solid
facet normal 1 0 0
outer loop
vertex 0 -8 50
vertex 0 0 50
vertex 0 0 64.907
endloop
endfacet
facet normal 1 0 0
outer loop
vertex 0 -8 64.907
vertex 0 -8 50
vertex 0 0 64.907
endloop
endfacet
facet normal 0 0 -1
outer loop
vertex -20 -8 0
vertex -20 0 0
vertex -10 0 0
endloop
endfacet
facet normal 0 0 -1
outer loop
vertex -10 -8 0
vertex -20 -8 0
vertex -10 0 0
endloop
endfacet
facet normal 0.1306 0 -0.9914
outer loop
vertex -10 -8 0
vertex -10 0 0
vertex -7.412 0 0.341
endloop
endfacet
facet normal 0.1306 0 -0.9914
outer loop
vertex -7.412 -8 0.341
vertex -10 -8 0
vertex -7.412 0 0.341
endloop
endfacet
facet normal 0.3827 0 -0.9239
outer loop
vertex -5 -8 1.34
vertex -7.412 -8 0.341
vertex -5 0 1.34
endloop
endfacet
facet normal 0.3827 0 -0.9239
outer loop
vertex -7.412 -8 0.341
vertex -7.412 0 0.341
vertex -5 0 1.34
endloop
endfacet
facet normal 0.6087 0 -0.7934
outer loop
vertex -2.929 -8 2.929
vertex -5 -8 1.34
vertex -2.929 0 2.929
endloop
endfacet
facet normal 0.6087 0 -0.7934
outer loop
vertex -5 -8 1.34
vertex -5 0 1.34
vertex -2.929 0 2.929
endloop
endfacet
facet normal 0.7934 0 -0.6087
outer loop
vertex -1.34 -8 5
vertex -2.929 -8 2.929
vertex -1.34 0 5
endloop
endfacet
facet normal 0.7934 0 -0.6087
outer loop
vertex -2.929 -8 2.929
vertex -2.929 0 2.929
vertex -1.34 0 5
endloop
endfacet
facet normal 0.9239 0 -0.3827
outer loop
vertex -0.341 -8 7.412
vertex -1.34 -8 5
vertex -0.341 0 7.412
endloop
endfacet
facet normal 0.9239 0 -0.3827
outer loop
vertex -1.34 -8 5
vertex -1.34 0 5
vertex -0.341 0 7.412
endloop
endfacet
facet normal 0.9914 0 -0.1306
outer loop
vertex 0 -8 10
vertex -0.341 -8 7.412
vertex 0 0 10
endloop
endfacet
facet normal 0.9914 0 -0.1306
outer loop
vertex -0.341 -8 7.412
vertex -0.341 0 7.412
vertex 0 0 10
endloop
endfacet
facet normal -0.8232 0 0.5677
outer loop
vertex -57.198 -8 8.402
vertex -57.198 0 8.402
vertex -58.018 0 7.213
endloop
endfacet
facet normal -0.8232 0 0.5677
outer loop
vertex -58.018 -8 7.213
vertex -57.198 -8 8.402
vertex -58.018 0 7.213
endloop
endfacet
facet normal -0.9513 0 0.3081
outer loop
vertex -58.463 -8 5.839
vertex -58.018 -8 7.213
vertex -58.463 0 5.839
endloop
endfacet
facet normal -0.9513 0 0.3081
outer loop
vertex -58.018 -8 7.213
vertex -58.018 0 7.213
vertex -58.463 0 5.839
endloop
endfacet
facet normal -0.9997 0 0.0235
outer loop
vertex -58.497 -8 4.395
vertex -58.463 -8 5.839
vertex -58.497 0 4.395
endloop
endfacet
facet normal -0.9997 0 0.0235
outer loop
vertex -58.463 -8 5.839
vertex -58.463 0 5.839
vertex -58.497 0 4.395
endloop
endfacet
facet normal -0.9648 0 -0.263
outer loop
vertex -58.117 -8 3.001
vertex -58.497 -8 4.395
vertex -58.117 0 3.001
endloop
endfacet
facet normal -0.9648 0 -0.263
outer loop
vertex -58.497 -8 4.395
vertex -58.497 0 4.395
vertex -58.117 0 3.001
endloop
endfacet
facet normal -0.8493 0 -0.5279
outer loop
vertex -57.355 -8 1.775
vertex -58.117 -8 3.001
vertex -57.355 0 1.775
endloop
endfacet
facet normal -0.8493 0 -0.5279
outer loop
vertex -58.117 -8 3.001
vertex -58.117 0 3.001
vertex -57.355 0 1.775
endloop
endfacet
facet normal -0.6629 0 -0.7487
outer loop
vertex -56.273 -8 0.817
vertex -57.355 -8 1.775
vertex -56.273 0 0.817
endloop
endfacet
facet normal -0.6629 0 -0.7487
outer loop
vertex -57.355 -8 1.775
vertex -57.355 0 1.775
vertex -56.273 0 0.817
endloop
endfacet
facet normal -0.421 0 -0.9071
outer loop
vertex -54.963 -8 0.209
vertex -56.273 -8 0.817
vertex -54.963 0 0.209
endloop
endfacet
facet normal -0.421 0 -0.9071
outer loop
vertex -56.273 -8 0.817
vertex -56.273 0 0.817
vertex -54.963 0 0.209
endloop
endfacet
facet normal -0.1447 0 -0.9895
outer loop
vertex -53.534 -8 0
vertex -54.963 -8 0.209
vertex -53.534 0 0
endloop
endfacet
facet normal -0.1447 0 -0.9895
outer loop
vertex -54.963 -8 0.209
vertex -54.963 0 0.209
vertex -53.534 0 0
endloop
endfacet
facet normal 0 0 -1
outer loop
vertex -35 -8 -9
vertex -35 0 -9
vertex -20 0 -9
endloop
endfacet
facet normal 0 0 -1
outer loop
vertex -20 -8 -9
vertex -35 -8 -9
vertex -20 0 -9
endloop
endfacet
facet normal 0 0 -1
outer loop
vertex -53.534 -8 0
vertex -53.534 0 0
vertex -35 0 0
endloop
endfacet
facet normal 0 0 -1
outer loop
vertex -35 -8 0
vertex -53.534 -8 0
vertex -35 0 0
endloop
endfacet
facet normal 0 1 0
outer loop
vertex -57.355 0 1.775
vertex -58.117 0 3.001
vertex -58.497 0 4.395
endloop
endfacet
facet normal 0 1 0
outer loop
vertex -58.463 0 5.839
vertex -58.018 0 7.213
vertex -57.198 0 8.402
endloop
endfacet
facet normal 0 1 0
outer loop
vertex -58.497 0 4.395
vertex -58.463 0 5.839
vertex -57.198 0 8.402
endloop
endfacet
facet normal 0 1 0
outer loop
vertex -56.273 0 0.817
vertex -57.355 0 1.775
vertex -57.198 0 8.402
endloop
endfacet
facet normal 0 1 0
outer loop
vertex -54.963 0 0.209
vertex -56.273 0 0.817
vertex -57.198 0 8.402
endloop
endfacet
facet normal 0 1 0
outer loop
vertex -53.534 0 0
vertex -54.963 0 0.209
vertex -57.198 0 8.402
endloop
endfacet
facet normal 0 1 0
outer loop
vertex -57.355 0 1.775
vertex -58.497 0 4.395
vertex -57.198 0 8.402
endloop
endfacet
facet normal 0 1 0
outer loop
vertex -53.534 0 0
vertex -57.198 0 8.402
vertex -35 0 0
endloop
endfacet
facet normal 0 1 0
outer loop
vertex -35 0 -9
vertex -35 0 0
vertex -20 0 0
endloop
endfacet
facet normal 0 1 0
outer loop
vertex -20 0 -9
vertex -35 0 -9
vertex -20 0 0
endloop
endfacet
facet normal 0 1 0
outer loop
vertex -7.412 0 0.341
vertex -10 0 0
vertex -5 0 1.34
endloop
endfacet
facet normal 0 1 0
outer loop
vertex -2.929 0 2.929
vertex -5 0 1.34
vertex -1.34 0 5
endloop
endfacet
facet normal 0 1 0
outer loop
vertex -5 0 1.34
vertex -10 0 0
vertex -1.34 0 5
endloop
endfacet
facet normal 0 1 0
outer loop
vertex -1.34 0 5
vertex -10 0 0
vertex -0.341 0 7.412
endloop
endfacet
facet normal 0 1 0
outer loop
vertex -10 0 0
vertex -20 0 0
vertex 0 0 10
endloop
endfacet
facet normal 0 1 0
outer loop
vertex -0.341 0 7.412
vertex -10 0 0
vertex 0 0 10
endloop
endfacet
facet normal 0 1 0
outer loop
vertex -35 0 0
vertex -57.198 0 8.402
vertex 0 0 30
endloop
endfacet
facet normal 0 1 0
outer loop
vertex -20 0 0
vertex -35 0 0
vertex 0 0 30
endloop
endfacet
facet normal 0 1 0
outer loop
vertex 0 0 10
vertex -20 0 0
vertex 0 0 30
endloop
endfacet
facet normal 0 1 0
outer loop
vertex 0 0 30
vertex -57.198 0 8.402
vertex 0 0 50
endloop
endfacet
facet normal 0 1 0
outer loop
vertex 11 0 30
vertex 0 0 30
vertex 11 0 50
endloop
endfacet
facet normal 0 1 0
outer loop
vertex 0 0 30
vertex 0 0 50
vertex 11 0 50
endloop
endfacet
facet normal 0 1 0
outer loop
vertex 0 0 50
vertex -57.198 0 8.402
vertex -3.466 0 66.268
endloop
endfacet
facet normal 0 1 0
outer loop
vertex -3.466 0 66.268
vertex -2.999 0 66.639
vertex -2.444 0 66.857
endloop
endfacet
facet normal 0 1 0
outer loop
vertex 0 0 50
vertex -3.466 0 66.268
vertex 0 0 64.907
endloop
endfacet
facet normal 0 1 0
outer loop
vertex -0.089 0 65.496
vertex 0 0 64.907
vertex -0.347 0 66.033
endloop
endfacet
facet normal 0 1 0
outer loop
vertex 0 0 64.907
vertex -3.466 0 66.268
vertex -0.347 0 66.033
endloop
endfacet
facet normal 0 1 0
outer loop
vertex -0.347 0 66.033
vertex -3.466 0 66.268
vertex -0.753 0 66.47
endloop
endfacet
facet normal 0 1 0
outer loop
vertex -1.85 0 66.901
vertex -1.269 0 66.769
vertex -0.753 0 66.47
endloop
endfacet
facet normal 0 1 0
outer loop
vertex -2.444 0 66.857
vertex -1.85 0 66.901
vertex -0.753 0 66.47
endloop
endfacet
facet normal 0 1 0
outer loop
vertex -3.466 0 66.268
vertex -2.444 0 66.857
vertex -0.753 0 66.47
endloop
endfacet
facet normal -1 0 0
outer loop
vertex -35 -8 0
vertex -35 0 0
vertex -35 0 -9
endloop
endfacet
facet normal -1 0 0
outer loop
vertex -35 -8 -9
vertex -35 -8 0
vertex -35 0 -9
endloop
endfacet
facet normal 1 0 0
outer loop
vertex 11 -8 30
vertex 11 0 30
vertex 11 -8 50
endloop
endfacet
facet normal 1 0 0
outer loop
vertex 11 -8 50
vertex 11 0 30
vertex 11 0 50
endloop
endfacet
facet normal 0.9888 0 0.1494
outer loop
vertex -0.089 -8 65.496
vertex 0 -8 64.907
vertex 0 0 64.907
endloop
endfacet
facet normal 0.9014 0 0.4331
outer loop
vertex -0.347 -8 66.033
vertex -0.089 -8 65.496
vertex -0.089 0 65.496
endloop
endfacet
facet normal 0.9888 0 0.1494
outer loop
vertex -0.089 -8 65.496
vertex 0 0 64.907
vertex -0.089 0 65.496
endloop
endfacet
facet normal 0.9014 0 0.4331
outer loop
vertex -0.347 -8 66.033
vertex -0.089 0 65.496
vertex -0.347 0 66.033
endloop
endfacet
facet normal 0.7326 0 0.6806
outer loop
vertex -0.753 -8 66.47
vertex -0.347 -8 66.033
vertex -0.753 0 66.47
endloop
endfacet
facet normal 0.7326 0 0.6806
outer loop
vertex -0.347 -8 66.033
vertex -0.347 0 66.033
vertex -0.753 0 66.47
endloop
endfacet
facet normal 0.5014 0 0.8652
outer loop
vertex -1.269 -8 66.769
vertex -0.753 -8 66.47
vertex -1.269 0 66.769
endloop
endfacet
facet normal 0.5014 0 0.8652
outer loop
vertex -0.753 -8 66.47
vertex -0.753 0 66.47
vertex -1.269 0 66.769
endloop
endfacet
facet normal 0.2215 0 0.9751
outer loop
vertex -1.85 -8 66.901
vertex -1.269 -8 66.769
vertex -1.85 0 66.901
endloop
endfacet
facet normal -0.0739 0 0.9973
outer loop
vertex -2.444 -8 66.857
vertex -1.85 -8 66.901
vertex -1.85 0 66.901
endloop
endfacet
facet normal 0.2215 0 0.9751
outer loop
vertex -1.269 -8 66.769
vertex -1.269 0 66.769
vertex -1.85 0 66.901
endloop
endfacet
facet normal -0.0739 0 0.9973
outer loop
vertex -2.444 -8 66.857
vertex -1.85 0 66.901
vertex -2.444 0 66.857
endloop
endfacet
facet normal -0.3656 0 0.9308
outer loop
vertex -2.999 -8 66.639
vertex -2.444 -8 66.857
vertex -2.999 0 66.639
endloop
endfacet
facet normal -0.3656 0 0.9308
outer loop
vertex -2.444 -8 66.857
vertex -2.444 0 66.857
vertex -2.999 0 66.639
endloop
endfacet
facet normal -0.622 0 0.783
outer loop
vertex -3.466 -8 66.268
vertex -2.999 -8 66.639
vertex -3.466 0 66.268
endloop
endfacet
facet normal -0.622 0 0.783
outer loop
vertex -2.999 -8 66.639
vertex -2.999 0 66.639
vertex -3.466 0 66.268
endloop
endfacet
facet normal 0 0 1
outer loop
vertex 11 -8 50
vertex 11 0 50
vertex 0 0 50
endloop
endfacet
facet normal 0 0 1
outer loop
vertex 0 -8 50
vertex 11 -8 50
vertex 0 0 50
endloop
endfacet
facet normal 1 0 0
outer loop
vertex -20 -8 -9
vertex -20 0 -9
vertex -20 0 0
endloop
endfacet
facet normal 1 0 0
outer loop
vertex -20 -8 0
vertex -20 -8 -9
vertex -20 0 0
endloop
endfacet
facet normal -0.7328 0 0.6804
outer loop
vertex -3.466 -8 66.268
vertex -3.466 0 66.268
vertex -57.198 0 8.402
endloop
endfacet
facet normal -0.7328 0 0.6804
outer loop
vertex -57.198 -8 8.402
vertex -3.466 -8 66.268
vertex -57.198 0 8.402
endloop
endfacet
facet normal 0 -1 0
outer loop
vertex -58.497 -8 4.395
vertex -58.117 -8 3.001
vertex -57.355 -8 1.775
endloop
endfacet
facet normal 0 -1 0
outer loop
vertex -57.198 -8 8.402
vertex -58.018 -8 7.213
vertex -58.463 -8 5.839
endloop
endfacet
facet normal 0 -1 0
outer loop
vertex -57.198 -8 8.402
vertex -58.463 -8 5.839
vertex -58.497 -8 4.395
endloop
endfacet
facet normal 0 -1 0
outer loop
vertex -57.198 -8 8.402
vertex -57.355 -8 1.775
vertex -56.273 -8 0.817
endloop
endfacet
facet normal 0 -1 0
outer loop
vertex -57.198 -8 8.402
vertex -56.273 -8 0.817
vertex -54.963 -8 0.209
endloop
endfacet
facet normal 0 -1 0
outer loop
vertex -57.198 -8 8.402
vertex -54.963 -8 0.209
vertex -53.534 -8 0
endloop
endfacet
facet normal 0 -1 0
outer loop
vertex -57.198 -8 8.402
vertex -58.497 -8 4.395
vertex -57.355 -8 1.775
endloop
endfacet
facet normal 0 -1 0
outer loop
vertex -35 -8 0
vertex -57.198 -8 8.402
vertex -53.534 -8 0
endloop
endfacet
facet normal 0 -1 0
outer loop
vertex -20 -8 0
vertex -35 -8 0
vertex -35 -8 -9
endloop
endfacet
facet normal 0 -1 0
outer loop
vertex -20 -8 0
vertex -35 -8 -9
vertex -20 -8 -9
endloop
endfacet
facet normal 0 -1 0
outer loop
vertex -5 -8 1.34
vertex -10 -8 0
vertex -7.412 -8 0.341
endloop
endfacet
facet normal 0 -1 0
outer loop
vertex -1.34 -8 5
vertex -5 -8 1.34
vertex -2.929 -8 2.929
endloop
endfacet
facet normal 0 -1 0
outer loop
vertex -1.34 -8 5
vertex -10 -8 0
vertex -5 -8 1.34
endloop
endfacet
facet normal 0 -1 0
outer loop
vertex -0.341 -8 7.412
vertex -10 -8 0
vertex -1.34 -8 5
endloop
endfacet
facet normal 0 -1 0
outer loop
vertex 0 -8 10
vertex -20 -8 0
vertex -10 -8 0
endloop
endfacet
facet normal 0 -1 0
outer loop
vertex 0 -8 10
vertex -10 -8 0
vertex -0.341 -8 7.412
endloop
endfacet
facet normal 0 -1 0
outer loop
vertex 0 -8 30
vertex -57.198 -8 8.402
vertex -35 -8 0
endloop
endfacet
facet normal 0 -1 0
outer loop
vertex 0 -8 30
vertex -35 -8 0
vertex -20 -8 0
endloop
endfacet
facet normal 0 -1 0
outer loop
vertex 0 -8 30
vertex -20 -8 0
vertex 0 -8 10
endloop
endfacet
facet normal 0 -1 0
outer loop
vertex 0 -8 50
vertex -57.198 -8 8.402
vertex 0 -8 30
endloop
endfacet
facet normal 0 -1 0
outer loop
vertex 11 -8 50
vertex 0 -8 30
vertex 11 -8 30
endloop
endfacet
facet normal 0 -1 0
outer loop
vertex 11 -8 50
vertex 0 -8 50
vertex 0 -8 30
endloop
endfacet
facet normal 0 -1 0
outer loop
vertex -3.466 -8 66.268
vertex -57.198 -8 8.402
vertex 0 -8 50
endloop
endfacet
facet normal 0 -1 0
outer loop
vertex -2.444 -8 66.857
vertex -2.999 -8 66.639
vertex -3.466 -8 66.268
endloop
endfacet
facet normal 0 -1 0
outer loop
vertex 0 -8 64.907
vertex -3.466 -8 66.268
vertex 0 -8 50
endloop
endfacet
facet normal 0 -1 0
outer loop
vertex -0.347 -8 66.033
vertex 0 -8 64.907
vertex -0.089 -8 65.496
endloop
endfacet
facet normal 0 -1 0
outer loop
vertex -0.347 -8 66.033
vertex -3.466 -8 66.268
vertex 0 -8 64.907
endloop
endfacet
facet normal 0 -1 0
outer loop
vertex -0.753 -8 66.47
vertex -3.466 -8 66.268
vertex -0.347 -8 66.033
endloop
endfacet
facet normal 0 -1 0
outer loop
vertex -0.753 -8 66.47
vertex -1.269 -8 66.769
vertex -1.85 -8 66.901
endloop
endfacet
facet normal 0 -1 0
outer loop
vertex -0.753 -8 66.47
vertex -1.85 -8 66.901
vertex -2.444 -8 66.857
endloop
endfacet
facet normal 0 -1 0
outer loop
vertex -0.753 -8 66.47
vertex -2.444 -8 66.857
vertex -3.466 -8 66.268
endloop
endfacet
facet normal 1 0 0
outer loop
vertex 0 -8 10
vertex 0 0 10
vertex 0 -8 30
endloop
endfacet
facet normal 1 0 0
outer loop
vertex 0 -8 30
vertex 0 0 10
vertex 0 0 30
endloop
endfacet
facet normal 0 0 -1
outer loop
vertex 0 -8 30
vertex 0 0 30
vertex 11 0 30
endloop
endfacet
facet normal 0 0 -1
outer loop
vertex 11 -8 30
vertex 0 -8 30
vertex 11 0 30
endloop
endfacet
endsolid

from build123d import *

# Parameters (mm, degrees)
F1_DEPTH = 8


with BuildPart() as f1:
    # F0 (on Front) → F1 (new body)
    with BuildSketch(Plane.XZ):
        with BuildLine():
            ThreePointArc((-57.197906, 8.402255), (-58.117129, 3.00141), (-53.533938, 0))
            Line((-53.533938, 0), (-35, 0))
            Line((-35, 0), (-35, -9))
            Line((-35, -9), (-20, -9))
            Line((-20, -9), (-20, 0))
            Line((-20, 0), (-10, 0))
            ThreePointArc((-10, 0), (-2.928932, 2.928932), (0, 10))
            Line((0, 10), (0, 30))
            Line((0, 30), (11, 30))
            Line((11, 30), (11, 50))
            Line((11, 50), (0, 50))
            Line((0, 50), (0, 64.906927))
            ThreePointArc((0, 64.906927), (-1.268964, 66.768536), (-3.465587, 66.267829))
            Line((-3.465587, 66.267829), (-57.197906, 8.402255))
        make_face()
    extrude(amount=F1_DEPTH)


solid = f1.part
